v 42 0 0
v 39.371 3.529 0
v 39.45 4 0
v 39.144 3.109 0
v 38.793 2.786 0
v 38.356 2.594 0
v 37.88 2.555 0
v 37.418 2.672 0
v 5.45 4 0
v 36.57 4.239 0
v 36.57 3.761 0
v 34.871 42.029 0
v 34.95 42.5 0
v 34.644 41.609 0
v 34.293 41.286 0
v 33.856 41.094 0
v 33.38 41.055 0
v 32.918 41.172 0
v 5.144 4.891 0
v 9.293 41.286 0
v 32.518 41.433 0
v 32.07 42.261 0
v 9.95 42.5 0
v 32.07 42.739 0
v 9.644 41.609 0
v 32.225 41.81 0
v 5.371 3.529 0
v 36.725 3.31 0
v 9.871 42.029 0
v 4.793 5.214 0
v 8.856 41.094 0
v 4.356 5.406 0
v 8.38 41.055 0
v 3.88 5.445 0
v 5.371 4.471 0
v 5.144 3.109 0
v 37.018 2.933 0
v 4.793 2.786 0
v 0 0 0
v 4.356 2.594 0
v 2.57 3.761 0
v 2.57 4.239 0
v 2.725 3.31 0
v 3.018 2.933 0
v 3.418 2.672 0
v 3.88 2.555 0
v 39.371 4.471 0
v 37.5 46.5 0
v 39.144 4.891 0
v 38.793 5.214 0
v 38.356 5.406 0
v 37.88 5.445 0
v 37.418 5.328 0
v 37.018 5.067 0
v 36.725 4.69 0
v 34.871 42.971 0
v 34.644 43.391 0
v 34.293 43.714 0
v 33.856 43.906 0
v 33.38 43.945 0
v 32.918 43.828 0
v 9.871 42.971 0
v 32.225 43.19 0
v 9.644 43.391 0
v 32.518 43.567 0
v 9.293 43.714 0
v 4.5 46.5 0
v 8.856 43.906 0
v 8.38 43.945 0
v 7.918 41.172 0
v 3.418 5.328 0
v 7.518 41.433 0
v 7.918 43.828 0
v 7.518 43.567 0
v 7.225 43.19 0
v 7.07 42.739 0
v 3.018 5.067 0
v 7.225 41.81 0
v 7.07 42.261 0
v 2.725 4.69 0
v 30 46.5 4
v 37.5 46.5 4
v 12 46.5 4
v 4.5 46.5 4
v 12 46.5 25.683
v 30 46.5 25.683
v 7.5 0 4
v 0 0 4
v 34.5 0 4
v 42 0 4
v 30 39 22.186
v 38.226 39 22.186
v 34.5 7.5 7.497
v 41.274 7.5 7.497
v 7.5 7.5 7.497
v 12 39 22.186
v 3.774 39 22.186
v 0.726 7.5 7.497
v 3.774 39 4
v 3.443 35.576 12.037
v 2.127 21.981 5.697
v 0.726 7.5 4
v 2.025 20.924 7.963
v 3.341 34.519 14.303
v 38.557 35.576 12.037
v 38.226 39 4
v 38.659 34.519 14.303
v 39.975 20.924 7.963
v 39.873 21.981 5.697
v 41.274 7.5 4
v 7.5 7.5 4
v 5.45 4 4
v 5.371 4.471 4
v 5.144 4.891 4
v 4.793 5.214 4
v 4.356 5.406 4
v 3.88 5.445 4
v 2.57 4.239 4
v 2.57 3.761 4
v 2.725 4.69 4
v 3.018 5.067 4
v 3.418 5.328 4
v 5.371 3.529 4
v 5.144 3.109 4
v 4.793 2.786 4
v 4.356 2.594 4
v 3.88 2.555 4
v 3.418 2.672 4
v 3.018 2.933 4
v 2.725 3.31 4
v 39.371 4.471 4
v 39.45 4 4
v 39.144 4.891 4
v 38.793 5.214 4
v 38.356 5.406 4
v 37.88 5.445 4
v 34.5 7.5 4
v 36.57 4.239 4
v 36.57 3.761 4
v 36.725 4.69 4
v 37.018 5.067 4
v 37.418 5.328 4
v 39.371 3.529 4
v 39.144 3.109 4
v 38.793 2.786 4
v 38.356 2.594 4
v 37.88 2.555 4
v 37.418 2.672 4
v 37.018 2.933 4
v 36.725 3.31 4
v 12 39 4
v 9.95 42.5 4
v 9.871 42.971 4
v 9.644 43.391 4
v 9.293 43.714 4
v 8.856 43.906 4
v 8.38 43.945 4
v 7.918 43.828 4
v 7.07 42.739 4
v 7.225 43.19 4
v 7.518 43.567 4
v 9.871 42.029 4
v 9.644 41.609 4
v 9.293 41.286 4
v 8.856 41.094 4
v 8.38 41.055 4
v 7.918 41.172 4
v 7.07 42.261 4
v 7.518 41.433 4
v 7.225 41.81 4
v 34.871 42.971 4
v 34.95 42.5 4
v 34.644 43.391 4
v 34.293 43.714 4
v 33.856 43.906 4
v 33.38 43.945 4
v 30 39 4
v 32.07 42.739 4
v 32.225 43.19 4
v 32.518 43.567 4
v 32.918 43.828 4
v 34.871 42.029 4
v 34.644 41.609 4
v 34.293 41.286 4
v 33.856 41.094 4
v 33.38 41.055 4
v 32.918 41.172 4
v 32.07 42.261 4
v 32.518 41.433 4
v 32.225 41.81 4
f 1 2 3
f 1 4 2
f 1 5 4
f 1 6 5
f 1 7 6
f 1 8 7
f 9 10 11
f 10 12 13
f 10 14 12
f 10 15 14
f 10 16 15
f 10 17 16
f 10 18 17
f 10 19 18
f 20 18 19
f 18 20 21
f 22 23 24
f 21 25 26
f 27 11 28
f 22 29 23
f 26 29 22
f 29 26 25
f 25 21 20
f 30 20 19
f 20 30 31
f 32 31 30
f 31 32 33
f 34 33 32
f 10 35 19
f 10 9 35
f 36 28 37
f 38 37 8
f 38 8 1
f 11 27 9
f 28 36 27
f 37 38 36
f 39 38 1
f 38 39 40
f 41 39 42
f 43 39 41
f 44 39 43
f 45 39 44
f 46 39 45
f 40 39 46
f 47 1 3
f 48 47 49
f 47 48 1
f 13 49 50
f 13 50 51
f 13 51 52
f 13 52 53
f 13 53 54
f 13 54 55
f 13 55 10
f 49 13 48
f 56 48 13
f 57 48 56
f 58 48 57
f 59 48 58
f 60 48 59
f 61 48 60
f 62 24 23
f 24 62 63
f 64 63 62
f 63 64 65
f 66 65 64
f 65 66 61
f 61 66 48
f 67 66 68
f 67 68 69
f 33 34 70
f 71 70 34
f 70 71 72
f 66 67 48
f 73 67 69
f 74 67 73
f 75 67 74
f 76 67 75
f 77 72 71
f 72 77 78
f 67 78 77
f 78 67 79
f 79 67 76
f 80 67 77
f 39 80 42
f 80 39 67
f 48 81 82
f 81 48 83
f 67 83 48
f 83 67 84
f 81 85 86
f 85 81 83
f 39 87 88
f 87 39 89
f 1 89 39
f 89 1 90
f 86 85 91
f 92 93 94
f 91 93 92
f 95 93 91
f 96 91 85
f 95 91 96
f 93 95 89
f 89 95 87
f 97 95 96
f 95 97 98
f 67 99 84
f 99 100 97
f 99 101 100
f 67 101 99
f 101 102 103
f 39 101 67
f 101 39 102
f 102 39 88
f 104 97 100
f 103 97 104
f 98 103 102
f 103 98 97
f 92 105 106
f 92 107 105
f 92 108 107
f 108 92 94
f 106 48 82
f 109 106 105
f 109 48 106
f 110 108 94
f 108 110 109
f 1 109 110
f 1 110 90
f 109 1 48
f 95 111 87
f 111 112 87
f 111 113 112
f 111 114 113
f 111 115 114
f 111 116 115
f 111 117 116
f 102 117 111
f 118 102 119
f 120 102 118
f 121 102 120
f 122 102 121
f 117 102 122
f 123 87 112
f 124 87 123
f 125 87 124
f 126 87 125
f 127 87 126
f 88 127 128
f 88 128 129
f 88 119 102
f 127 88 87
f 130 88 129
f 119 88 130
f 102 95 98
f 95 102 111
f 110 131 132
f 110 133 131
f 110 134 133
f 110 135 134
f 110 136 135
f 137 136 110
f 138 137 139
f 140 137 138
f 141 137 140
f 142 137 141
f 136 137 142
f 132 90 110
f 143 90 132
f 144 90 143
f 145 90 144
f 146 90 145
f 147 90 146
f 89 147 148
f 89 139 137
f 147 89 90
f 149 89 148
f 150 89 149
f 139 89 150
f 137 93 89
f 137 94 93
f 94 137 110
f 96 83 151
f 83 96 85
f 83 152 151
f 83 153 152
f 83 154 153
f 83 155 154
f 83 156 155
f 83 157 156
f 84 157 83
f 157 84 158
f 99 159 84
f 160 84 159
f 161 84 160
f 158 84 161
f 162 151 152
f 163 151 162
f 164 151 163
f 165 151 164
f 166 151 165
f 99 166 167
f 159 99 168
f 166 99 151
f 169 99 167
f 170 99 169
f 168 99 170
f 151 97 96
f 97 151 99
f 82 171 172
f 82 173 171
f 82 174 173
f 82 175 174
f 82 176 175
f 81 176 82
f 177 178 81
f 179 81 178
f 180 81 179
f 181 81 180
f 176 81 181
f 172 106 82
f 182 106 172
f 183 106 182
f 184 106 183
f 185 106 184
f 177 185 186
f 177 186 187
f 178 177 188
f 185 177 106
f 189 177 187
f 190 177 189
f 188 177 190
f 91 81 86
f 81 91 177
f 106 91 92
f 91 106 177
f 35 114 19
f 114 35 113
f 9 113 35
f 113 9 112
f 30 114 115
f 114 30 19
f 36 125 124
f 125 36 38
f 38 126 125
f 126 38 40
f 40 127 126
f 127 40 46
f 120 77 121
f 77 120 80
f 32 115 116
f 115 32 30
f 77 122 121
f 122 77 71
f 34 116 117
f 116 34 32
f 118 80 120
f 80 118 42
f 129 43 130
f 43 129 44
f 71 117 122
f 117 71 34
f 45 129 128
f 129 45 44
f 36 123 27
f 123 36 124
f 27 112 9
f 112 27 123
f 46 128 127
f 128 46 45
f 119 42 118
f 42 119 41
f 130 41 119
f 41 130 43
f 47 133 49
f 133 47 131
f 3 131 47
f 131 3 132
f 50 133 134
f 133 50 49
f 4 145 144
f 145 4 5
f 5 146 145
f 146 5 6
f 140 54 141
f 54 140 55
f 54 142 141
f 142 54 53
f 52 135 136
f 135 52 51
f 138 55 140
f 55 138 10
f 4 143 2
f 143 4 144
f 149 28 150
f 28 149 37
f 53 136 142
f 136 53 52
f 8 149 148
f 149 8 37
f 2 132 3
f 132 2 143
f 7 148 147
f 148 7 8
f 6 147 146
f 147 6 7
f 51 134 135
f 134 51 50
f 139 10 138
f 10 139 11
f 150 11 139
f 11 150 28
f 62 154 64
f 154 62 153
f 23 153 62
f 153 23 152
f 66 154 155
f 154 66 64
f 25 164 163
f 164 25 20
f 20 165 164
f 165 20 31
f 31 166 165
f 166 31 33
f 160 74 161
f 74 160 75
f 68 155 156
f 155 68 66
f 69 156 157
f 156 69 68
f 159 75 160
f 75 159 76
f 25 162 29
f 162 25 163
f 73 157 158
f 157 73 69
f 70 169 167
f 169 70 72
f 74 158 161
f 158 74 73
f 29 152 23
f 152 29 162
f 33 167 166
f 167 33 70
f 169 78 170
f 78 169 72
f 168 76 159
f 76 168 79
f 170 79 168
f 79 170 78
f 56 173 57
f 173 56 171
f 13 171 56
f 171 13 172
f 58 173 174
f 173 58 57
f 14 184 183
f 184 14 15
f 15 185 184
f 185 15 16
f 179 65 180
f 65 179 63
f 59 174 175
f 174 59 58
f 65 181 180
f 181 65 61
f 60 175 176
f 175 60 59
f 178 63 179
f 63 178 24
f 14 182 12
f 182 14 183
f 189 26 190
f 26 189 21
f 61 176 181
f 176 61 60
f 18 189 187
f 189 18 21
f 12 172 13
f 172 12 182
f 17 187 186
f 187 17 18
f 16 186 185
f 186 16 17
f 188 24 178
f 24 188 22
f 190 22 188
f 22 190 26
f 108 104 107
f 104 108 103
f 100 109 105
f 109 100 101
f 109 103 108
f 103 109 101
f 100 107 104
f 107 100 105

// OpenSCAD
$fa = 0.5; // default minimum facet angle is now 0.5
$fs = 0.5; // default minimum facet size is now 0.5 

tilt = 25;

back_width = 42;
front_width = 33;
length = 46.5;
min_height = 4;

offset = 4;

screw_outer = 7;
//screw_outer=12;
screw_inner = 2.9;

strap_length = 15;
strap_width = 2.5;

a = (back_width-front_width)/2;
c = sqrt(pow(length,2) + pow(a,2));
alpha = asin(a/c);

difference() {
    cube([back_width, length, length]);
    
    translate([-back_width/2,0,min_height])
        rotate([tilt, 0, 0])
        cube([2*back_width, 2*length, 2*length]);
    rotate([0,0,-alpha])
        translate([-2*back_width,0,-5])
        cube([2*back_width, 2*length, 2*length]);
    translate([back_width,0,-5])
        rotate([0,0,alpha])
        cube([2*back_width, 2*length, 2*length]);

    translate([-screw_outer+offset+screw_outer/2,-screw_outer+offset+screw_outer/2,length/2+min_height])
        cube([2*screw_outer,2*screw_outer,length],center=true);
    translate([back_width+screw_outer-offset-screw_outer/2,-screw_outer+offset+screw_outer/2,length/2+min_height])
        cube([2*screw_outer,2*screw_outer,length],center=true);
    translate([a-screw_outer+offset+screw_outer/2,length+screw_outer-offset-screw_outer/2,length/2+min_height])
        cube([2*screw_outer,2*screw_outer,length],center=true);
    translate([a+screw_outer+front_width-offset-screw_outer/2,length+screw_outer-offset-screw_outer/2,length/2+min_height])
        cube([2*screw_outer,2*screw_outer,length],center=true);
    
    translate([offset,offset,0])   
        cylinder(h=2*length, r=screw_inner/2, center=true);
    translate([back_width-offset,offset,0])
        cylinder(h=2*length, r=screw_inner/2, center=true);
    translate([a+offset,length-offset,0])
        cylinder(h=2*length, r=screw_inner/2, center=true);
    translate([a+front_width-offset,length-offset,0])
        cylinder(h=2*length, r=screw_inner/2, center=true);
        
    translate([back_width/2+2,length/2+5,10])
        rotate([tilt,0,0])
        cube([back_width+5,strap_length,strap_width], center=true);
}
